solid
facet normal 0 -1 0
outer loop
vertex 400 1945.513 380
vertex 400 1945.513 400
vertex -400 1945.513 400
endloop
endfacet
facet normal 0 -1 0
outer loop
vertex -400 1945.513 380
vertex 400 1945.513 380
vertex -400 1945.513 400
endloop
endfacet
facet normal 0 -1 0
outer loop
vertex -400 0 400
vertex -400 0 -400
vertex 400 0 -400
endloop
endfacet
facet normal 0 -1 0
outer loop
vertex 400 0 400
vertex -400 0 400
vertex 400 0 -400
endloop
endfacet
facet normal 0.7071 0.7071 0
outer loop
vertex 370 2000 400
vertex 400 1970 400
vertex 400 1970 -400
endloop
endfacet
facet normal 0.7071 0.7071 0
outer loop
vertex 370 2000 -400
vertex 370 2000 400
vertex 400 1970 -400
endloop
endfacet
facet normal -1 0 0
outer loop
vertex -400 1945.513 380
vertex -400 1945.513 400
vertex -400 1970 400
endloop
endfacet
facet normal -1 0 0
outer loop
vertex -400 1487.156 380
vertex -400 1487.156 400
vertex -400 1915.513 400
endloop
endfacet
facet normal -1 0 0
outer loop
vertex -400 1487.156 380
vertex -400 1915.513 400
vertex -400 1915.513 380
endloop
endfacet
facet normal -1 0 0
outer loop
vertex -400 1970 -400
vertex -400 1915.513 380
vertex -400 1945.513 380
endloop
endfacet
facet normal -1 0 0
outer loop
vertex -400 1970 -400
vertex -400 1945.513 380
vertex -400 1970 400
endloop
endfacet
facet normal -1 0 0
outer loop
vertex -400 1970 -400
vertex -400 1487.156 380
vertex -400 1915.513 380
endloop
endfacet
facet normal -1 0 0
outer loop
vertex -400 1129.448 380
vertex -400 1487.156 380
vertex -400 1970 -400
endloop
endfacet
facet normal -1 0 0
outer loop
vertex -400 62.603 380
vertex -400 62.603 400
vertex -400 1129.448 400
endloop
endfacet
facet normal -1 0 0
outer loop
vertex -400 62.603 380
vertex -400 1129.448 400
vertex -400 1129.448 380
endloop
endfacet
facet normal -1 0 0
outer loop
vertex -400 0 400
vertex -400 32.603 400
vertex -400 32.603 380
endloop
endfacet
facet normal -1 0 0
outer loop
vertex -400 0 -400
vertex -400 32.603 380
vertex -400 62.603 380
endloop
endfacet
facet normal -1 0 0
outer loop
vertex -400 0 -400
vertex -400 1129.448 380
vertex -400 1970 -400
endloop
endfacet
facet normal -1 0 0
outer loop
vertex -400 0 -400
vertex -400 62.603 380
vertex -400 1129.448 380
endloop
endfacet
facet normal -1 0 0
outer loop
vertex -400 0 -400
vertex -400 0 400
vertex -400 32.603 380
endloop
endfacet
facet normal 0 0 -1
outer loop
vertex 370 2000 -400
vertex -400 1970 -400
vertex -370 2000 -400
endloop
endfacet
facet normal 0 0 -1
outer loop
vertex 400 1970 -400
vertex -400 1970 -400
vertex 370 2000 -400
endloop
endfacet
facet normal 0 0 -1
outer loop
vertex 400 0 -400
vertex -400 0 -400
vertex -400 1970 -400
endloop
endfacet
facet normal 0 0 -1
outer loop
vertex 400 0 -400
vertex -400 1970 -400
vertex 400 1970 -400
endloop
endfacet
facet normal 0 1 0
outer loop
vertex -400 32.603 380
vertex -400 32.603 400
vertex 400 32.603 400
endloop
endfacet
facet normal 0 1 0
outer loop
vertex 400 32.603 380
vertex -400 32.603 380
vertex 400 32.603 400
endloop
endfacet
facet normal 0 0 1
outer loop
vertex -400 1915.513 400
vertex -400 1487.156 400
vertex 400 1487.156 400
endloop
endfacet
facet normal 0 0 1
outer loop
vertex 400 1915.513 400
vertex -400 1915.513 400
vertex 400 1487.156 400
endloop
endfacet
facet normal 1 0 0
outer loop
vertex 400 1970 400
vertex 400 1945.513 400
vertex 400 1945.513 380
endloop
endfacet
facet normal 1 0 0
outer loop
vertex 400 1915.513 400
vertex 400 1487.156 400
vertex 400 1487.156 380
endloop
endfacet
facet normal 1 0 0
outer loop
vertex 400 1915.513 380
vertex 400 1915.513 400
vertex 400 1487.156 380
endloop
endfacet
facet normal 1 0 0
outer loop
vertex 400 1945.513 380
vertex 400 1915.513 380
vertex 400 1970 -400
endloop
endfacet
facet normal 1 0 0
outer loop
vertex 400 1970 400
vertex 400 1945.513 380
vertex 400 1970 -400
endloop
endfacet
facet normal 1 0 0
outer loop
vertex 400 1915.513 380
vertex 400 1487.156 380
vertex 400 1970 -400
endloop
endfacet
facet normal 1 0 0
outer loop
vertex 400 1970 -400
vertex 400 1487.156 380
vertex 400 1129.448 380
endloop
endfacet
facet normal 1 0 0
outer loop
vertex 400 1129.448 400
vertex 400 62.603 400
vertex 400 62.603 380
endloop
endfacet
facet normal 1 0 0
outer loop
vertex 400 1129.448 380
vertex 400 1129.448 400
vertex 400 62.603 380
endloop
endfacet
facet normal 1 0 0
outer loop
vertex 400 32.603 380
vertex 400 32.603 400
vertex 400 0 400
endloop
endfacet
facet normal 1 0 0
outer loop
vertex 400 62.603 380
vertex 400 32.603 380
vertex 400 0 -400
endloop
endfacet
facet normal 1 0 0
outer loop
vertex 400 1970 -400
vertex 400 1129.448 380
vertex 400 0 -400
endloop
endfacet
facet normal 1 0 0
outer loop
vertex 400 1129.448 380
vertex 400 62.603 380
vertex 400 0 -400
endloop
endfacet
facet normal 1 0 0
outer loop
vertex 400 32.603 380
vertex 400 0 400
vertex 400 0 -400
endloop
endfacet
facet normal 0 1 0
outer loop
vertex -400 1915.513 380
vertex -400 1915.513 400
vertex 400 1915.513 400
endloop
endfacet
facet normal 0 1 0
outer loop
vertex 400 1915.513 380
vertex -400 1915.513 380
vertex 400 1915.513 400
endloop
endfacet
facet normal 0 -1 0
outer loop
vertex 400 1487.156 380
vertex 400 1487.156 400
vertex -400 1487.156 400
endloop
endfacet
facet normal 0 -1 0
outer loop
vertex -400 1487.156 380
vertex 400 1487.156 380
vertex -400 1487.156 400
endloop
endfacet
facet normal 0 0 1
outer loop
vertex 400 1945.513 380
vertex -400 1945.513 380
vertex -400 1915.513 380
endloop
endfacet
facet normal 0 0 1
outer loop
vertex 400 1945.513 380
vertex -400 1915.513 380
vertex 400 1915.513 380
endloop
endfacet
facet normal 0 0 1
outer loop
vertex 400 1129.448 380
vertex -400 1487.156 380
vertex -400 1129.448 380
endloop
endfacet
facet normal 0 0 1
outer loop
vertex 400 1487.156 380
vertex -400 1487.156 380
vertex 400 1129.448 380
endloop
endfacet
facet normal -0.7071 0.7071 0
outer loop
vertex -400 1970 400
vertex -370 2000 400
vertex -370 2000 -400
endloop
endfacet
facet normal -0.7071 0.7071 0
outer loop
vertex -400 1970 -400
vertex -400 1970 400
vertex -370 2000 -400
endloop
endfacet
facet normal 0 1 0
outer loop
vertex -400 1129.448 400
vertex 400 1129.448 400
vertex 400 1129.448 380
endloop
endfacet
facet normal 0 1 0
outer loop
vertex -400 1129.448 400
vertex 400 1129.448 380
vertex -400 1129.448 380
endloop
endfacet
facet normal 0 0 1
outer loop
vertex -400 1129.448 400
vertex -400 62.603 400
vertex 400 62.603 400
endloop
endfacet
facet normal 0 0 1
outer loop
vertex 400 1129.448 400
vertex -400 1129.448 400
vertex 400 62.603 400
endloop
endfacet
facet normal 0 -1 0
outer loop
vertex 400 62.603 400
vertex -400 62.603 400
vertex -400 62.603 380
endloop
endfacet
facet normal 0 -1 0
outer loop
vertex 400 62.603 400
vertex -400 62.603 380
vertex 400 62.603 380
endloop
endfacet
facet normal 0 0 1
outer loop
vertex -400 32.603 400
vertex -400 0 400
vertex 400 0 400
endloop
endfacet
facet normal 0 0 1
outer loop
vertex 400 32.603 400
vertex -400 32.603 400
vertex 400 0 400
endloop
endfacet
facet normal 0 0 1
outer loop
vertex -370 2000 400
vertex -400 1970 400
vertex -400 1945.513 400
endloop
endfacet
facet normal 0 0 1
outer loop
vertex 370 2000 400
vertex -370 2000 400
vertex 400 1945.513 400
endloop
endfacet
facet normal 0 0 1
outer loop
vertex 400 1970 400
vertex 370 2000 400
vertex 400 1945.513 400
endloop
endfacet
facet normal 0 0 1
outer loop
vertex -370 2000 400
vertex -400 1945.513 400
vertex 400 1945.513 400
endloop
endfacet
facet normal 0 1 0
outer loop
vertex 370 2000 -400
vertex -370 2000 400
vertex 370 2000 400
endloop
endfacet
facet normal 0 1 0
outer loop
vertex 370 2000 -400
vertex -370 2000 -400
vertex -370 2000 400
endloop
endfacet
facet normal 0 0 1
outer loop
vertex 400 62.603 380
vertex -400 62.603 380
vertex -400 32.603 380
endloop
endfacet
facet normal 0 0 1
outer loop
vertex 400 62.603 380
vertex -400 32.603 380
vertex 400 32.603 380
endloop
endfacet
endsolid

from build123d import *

# Parameters (mm, degrees)
CROQUIS1_W              = 800
CROQUIS1_H              = 800
SALIENTE_EXTRUIR1_DEPTH = 2000
CORTAR_EXTRUIR1_DEPTH   = 20
CHAFL_N1_SIZE           = 30


with BuildPart() as part:
    # Croquis1 → Saliente-Extruir1 (new body)
    with BuildSketch(Plane(origin=(0, 0, 0), x_dir=(1, 0, 0), z_dir=(0, 1, 0))):
        Rectangle(CROQUIS1_W, CROQUIS1_H)
    extrude(amount=SALIENTE_EXTRUIR1_DEPTH)

    # Croquis2 → Cortar-Extruir1 (cut)
    with BuildSketch(Plane.XY.offset(400)):
        with BuildLine():
            Line((-453.105485689, 1895.512731964), (-453.105485689, 82.602501534))
            ThreePointArc((-453.105485689, 82.602501534), (-438.460824748, 47.247162475), (-403.105485689, 32.602501534))
            Line((-403.105485689, 32.602501534), (426.238550511, 32.602501534))
            ThreePointArc((426.238550511, 32.602501534), (461.59388957, 47.247162475), (476.238550511, 82.602501534))
            Line((476.238550511, 82.602501534), (476.238550511, 1895.512731964))
            ThreePointArc((476.238550511, 1895.512731964), (461.59388957, 1930.868071024), (426.238550511, 1945.512731964))
            Line((426.238550511, 1945.512731964), (-403.105485689, 1945.512731964))
            ThreePointArc((-403.105485689, 1945.512731964), (-438.460824748, 1930.868071024), (-453.105485689, 1895.512731964))
        make_face()
        with BuildLine():
            Line((-403.105485689, 1915.512731964), (426.238550511, 1915.512731964))
            ThreePointArc((426.238550511, 1915.512731964), (440.380686134, 1909.654867588), (446.238550511, 1895.512731964))
            Line((446.238550511, 1895.512731964), (446.238550511, 1487.15617354))
            Line((446.238550511, 1487.15617354), (-423.105485689, 1487.15617354))
            Line((-423.105485689, 1487.15617354), (-423.105485689, 1895.512731964))
            ThreePointArc((-423.105485689, 1895.512731964), (-417.247621312, 1909.654867588), (-403.105485689, 1915.512731964))
        make_face(mode=Mode.SUBTRACT)
        with BuildLine():
            Line((-403.105485689, 62.602501534), (426.238550511, 62.602501534))
            ThreePointArc((426.238550511, 62.602501534), (440.380686134, 68.460365911), (446.238550511, 82.602501534))
            Line((446.238550511, 82.602501534), (446.238550511, 1129.448445192))
            Line((446.238550511, 1129.448445192), (-423.105485689, 1129.448445192))
            Line((-423.105485689, 1129.448445192), (-423.105485689, 82.602501534))
            ThreePointArc((-423.105485689, 82.602501534), (-417.247621312, 68.460365911), (-403.105485689, 62.602501534))
        make_face(mode=Mode.SUBTRACT)
    extrude(amount=-CORTAR_EXTRUIR1_DEPTH, mode=Mode.SUBTRACT)

    # Chaflán1
    chafl_n1_edges = [part.edges().sort_by_distance(p)[0] for p in [
        (-400, 2000, 0),
        (400, 2000, 0),
    ]]
    chamfer(chafl_n1_edges, length=CHAFL_N1_SIZE)


solid = part.part
